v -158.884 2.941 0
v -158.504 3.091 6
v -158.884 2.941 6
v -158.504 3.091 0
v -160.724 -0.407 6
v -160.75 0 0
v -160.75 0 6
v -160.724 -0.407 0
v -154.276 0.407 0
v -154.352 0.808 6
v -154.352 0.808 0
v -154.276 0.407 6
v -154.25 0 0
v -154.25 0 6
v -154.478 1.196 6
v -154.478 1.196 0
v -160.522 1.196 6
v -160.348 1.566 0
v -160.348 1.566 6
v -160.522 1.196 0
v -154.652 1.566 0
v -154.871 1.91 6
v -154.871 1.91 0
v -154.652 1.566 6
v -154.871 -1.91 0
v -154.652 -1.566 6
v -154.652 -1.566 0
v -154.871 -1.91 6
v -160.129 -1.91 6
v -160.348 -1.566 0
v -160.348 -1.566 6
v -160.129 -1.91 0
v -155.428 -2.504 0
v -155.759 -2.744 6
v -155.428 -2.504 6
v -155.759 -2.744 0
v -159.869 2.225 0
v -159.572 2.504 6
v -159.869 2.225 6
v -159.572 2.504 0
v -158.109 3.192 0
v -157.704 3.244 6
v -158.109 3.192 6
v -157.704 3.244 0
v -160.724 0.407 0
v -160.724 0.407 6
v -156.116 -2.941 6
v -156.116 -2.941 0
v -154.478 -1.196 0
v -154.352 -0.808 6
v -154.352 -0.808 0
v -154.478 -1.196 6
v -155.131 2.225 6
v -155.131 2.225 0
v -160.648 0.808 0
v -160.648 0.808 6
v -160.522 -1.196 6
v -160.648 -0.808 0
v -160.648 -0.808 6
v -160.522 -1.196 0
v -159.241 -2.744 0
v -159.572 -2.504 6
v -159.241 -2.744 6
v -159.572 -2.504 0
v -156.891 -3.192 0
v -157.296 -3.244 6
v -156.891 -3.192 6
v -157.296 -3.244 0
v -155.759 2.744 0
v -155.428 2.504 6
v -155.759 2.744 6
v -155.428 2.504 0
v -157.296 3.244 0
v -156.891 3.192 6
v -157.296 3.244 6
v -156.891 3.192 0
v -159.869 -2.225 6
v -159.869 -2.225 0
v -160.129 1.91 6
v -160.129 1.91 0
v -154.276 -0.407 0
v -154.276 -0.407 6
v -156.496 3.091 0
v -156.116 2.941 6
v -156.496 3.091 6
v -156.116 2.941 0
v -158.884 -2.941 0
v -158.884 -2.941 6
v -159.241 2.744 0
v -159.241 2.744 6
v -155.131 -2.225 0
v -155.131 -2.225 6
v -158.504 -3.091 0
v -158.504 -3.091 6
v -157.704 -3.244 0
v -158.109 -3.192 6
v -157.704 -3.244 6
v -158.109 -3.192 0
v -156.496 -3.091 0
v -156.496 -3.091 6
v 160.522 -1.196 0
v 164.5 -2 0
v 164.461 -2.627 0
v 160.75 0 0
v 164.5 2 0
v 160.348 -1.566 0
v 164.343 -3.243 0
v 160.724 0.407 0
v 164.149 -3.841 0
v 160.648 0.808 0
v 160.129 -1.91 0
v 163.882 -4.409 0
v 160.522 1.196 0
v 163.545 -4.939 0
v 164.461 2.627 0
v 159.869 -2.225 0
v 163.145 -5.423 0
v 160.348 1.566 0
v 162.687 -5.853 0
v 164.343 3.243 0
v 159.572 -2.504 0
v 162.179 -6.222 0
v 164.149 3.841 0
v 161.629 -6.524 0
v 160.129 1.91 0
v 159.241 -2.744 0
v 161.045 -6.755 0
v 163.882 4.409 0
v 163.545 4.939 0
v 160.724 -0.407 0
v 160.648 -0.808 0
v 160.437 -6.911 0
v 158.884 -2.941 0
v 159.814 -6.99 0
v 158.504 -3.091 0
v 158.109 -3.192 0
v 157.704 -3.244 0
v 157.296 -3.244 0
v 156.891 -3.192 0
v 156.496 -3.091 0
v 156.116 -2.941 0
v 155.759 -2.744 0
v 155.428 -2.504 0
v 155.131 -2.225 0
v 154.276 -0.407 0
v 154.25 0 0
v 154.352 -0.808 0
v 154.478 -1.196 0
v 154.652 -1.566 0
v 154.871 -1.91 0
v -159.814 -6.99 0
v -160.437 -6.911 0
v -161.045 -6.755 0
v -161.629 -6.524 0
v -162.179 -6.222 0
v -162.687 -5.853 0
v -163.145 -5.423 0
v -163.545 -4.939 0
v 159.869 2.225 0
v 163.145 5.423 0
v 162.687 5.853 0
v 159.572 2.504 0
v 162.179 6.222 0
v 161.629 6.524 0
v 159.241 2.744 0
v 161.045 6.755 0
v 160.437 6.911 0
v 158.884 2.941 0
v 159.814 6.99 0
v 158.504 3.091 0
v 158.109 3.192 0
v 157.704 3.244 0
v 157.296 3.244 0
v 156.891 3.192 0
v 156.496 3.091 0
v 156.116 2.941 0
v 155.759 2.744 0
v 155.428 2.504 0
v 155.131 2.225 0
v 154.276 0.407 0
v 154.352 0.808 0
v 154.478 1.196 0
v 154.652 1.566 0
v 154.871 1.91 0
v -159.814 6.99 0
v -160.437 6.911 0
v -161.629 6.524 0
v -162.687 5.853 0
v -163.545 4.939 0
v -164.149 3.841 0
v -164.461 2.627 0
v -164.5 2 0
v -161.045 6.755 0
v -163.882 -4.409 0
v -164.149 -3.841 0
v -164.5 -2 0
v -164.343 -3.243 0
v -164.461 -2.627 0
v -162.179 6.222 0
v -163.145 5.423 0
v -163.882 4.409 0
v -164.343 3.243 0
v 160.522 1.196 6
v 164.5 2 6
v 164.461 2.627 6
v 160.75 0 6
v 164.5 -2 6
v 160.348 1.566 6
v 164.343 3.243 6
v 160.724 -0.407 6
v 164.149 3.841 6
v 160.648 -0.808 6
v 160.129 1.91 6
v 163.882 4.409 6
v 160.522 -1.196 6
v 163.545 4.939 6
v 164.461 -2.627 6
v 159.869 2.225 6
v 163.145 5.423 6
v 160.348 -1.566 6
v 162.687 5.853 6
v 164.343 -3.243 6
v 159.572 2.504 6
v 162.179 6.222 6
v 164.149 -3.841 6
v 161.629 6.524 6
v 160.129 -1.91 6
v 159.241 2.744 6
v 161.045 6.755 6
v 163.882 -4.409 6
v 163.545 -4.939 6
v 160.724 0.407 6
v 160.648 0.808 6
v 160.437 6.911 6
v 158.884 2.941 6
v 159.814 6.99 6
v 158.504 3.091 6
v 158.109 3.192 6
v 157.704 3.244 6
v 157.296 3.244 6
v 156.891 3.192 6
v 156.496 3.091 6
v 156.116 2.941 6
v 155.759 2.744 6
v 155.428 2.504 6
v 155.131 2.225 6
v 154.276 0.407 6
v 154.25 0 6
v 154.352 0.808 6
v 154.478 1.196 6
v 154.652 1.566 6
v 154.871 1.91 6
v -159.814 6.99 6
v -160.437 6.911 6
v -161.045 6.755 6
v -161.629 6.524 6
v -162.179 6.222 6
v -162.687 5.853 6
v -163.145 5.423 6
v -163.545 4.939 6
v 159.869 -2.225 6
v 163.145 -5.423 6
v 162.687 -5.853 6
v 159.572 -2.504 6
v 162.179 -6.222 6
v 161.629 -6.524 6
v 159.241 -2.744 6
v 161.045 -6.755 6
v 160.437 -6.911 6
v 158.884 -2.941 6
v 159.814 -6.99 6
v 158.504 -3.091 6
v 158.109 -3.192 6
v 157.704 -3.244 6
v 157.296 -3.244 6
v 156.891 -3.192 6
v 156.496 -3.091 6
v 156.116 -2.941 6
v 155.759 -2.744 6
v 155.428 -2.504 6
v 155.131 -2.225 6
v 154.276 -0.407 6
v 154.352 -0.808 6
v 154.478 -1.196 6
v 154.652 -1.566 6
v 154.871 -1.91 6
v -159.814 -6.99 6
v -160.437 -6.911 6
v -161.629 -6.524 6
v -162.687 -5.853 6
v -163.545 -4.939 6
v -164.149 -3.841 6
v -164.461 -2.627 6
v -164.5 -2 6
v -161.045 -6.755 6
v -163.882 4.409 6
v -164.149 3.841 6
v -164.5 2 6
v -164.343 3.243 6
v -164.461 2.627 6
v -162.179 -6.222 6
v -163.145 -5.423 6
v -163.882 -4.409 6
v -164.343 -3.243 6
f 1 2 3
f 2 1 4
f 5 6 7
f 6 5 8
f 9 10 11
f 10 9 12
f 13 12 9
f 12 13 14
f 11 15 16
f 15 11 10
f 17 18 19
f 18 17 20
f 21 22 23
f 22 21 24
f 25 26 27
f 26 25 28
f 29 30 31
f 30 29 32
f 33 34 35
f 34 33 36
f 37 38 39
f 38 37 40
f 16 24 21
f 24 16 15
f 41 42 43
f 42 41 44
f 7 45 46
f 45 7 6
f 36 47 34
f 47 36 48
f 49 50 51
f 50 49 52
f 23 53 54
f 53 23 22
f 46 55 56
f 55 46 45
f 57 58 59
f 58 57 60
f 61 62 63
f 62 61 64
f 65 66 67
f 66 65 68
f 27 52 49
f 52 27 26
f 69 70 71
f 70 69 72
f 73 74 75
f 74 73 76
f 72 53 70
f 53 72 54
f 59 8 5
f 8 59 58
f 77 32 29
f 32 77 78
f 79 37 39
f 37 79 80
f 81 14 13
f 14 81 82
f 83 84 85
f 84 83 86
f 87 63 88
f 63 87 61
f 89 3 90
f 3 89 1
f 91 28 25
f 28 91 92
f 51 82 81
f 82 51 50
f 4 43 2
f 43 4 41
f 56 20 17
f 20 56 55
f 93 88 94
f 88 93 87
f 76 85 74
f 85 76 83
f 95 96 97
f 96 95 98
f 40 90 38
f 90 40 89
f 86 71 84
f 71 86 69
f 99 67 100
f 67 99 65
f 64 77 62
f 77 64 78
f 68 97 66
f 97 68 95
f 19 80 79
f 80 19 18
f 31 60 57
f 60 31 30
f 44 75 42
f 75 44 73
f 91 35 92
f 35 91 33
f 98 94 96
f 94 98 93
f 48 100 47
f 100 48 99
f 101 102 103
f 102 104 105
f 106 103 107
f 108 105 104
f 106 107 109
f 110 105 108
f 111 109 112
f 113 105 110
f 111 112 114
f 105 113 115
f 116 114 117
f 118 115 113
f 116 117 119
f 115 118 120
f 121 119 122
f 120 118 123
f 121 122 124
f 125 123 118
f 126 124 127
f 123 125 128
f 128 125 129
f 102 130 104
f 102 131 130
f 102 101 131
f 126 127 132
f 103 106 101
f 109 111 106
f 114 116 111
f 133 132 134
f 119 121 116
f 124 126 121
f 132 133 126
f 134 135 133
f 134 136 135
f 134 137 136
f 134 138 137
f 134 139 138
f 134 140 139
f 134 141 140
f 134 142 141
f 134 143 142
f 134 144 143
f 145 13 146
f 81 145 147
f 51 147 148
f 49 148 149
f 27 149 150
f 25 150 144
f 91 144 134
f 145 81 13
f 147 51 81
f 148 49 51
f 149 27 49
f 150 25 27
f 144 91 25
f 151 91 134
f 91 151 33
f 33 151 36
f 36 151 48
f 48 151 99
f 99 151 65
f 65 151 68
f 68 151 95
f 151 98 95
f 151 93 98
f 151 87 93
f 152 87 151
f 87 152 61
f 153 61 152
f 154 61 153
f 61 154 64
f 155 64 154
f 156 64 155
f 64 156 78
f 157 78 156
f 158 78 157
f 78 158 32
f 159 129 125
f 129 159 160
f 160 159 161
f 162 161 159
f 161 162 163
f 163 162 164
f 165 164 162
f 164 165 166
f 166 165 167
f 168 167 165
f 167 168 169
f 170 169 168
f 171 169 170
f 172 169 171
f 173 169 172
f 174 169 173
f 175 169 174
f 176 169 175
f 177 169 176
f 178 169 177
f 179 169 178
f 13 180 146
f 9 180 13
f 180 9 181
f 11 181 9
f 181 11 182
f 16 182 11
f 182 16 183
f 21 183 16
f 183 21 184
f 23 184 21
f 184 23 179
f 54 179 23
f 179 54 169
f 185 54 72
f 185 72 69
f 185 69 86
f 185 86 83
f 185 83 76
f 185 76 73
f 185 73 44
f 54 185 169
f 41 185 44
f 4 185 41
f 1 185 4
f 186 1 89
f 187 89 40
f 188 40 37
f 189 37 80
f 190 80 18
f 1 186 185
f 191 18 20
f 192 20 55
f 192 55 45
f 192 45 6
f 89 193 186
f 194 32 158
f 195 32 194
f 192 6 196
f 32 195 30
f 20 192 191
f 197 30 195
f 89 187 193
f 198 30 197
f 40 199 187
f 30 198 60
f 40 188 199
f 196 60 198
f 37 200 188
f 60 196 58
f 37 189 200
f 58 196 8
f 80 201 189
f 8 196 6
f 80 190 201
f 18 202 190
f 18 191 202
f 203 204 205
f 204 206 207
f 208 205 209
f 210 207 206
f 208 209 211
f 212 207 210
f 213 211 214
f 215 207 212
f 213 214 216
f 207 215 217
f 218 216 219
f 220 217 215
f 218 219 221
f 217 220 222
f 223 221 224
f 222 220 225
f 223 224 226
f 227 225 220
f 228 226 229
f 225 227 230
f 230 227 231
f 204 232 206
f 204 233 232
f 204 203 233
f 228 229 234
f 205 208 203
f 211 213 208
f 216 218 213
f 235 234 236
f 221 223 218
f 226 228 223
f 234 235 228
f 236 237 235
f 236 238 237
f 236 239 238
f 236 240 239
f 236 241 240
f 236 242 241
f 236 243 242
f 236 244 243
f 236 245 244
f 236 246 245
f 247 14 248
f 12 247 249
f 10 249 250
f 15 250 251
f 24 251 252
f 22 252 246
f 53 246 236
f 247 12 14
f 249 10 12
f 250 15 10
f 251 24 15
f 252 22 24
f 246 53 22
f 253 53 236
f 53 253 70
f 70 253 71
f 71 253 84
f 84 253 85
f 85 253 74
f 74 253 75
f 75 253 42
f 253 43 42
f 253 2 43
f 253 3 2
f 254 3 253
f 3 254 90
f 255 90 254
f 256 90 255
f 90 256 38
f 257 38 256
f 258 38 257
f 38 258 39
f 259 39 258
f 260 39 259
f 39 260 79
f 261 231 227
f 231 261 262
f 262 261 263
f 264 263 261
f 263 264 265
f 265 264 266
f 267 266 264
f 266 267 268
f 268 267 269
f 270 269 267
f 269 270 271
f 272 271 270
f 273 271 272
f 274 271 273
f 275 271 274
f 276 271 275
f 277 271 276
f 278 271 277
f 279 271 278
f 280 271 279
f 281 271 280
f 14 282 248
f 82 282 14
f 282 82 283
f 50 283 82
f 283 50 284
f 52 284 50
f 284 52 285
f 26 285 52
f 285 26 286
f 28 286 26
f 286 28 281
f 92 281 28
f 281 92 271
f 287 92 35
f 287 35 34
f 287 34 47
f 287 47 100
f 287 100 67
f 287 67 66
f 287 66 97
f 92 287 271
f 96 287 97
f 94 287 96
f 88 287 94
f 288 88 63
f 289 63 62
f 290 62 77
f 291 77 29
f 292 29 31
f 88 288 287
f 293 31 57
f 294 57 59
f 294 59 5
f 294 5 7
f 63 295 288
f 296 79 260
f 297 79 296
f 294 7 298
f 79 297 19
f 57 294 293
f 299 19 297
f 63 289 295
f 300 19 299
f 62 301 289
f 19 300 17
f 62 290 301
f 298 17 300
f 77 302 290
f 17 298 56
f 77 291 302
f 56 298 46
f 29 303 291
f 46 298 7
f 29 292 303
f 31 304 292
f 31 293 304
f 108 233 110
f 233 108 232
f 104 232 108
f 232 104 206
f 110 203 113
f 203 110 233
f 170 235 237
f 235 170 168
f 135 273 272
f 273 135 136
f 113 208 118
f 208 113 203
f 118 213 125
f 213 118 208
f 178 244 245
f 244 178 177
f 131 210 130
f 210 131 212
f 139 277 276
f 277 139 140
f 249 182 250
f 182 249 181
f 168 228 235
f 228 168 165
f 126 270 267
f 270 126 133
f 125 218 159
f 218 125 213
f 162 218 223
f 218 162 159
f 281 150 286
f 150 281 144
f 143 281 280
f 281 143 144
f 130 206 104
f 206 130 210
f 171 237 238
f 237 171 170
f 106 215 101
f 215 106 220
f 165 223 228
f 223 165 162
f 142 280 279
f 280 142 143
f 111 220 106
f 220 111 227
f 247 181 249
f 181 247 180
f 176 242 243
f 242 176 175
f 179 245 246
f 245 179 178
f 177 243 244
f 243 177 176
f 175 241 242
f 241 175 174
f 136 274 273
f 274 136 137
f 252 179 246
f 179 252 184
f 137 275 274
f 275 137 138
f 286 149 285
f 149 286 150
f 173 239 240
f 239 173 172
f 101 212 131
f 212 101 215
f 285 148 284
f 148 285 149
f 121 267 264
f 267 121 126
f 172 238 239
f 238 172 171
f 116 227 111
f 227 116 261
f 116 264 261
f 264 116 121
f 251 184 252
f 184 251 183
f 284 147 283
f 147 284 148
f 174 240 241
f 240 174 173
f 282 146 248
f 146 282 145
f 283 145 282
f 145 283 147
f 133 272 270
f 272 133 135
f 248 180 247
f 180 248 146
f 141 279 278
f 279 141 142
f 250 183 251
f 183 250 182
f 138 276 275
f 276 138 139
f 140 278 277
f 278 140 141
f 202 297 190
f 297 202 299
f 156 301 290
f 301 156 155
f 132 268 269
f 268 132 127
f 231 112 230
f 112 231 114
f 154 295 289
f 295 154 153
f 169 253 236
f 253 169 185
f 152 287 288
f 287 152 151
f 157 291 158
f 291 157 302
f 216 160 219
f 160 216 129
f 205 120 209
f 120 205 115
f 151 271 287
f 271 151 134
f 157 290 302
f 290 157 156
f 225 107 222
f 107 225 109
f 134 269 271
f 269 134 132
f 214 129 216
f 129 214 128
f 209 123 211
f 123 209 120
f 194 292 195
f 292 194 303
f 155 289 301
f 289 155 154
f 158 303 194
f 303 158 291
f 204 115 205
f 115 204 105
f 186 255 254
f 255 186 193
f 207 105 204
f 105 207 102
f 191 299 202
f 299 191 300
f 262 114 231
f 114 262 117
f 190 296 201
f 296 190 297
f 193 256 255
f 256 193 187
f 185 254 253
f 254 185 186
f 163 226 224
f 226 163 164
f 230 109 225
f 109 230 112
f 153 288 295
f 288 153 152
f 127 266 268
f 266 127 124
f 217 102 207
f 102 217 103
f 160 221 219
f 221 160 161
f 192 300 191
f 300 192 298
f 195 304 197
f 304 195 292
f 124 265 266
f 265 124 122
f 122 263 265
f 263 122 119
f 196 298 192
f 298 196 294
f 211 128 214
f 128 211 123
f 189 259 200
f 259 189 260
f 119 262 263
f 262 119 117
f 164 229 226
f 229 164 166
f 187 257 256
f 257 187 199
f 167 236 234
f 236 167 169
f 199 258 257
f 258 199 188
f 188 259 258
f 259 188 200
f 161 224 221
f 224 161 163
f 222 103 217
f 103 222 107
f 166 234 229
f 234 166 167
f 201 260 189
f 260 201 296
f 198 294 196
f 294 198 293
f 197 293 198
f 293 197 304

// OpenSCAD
$fn = 50;


difference() {
	union() {
		hull() {
			translate(v = [-159.5000000000, 2.0000000000, 0]) {
				cylinder(h = 6, r = 5);
			}
			translate(v = [159.5000000000, 2.0000000000, 0]) {
				cylinder(h = 6, r = 5);
			}
			translate(v = [-159.5000000000, -2.0000000000, 0]) {
				cylinder(h = 6, r = 5);
			}
			translate(v = [159.5000000000, -2.0000000000, 0]) {
				cylinder(h = 6, r = 5);
			}
		}
	}
	union() {
		translate(v = [-157.5000000000, 0.0000000000, 0]) {
			cylinder(h = 6, r = 3.2500000000);
		}
		translate(v = [157.5000000000, 0.0000000000, 0]) {
			cylinder(h = 6, r = 3.2500000000);
		}
		translate(v = [-157.5000000000, 0.0000000000, 0]) {
			cylinder(h = 6, r = 1.8000000000);
		}
		translate(v = [157.5000000000, 0.0000000000, 0]) {
			cylinder(h = 6, r = 1.8000000000);
		}
		translate(v = [-157.5000000000, 0.0000000000, 0]) {
			cylinder(h = 6, r = 1.8000000000);
		}
		translate(v = [157.5000000000, 0.0000000000, 0]) {
			cylinder(h = 6, r = 1.8000000000);
		}
		translate(v = [-157.5000000000, 0.0000000000, 0]) {
			cylinder(h = 6, r = 1.8000000000);
		}
		translate(v = [157.5000000000, 0.0000000000, 0]) {
			cylinder(h = 6, r = 1.8000000000);
		}
	}
}
